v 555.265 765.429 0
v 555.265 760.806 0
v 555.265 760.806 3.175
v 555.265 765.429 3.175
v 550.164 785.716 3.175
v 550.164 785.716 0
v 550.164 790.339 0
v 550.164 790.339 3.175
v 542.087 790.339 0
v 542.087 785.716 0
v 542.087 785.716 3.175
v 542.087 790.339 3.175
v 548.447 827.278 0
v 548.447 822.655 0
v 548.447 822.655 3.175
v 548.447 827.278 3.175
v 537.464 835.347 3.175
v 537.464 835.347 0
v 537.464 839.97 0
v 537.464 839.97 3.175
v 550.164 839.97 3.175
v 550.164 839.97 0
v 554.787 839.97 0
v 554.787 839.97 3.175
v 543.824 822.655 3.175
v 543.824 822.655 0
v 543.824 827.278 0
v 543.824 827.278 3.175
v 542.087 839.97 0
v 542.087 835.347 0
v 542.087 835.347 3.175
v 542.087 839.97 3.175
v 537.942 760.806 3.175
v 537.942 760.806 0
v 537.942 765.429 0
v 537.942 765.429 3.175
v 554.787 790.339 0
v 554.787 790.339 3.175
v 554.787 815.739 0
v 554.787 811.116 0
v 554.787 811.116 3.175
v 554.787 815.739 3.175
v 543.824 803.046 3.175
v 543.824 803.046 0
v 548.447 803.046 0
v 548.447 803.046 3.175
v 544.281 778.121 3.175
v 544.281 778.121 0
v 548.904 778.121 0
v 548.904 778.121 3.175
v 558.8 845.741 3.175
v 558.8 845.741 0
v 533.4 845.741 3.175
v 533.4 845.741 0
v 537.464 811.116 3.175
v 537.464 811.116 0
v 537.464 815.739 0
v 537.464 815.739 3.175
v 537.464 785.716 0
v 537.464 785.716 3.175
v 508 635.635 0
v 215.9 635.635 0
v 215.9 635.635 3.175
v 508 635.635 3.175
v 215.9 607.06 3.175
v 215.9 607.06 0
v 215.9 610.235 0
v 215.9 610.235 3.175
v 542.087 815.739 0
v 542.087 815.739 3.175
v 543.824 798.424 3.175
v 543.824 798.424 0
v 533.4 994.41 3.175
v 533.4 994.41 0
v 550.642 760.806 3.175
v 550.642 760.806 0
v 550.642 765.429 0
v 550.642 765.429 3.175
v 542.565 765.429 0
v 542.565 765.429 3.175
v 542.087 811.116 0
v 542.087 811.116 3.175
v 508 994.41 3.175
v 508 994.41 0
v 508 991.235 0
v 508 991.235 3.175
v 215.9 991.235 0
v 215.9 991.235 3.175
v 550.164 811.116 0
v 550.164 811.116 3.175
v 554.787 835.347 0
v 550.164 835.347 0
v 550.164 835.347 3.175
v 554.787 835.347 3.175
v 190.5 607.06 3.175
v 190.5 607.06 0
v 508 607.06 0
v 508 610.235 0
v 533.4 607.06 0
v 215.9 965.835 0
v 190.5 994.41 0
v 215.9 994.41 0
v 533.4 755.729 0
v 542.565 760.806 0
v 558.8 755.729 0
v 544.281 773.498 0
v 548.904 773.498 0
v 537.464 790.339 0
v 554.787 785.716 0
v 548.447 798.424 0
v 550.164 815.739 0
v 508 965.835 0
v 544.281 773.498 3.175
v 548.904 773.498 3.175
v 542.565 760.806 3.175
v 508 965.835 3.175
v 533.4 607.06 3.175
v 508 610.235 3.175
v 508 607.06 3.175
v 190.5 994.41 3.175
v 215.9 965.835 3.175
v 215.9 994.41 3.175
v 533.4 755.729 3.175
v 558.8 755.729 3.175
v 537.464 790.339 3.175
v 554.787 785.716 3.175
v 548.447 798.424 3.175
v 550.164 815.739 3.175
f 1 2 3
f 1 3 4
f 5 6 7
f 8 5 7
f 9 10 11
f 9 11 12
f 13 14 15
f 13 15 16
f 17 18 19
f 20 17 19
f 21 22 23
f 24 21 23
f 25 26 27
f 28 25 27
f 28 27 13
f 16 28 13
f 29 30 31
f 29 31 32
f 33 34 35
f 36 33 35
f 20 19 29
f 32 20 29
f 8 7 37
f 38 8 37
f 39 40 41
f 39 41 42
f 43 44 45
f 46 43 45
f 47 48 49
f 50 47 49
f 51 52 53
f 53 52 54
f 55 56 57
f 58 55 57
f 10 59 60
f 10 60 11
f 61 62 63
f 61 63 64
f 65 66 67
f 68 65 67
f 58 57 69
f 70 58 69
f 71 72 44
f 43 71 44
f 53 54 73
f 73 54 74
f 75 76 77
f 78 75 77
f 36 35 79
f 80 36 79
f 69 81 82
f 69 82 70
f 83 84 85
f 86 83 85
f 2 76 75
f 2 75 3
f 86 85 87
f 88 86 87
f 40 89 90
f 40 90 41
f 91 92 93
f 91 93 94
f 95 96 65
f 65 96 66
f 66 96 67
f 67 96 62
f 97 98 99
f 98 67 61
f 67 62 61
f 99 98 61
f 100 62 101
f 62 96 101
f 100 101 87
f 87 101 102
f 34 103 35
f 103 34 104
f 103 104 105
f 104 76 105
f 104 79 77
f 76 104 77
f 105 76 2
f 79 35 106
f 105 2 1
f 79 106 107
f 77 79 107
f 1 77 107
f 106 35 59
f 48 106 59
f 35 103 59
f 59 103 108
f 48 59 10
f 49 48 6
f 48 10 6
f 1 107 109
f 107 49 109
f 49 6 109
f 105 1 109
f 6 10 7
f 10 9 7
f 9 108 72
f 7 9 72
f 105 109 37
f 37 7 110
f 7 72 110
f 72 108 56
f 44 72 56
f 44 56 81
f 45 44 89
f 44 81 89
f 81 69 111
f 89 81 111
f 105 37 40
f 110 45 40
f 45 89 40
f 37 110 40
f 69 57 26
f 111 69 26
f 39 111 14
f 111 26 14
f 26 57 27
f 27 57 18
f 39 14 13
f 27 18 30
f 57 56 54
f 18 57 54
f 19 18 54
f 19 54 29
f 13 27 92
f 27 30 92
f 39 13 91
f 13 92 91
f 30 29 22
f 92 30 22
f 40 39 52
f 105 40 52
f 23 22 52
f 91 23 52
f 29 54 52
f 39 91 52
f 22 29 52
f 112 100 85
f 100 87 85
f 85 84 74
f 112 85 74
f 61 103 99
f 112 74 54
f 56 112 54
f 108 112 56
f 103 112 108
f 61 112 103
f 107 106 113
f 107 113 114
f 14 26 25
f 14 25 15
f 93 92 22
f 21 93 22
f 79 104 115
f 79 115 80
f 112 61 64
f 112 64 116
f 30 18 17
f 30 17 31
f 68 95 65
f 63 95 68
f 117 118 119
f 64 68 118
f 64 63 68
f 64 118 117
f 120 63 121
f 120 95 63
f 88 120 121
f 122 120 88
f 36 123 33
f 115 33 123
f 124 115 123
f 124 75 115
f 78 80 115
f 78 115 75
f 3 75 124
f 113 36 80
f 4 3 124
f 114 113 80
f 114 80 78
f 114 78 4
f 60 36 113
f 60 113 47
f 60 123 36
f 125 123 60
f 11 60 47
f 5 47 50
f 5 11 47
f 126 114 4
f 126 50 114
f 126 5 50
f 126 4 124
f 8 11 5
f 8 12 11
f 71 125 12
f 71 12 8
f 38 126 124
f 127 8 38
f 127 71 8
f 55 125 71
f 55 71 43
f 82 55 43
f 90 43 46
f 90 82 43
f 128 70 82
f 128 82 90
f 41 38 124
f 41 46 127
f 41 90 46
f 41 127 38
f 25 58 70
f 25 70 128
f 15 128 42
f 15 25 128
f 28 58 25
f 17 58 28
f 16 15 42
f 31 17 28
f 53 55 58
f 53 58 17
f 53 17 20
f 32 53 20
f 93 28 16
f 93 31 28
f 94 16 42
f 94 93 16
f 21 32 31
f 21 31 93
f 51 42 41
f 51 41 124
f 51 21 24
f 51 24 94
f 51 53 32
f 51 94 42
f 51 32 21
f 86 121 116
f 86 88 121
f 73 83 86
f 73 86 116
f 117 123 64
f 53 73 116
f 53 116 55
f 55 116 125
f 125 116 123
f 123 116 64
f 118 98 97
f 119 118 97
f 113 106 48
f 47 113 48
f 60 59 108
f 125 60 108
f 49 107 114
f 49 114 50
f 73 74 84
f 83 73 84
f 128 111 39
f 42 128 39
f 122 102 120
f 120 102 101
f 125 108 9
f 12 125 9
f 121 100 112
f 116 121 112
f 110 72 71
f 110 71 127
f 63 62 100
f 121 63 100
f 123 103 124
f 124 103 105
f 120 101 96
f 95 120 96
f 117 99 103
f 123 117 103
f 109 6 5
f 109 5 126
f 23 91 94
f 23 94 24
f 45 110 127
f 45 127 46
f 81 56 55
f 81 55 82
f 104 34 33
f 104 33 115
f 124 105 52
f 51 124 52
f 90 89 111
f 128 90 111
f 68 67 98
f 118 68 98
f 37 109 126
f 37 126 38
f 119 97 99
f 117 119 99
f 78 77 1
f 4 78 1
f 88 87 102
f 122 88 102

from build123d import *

# Parameters (mm, degrees)
F0_W     = 4.6228
F0_H     = 4.6228
F0_W_2   = 292.1
F0_H_2   = 330.2
F1_DEPTH = 3.175


# Not quite as in the source:
# - a length typed as a fraction of an inch, garbled in the dataset ("3 / 203.2 mm" for 3/8 in), is restored


with BuildPart() as f1:
    # F0 (on Top) → F1 (new body)
    with BuildSketch(Plane.XY):
        Polygon((190.4998123646, 755.6496634722), (190.4998123646, 635.6350152016), (190.4998123646, 610.2350152016), (190.4998123646, 607.0600152016), (215.8998123646, 607.0600152016), (215.8998123646, 610.2350152016), (507.9998123646, 610.2350152016), (507.9998123646, 607.0600152016), (533.3998123646, 607.0600152016), (533.3998123646, 610.2350152016), (533.3998123646, 755.7291580558), (558.7998123646, 755.7291580558), (558.7998123646, 760.8061958763), (558.7998123646, 800.7350152016), (558.7998123646, 845.7408688016), (533.3998123646, 845.7408688016), (533.3998123646, 991.2350152016), (533.3998123646, 994.4100152016), (507.9998123646, 994.4100152016), (507.9998123646, 991.2350152016), (215.8998123646, 991.2350152016), (215.8998123646, 994.4100152016), (190.4998123646, 994.4100152016), (190.4998123646, 991.2350152016), (190.4998123646, 857.2496634722), align=None)
        with Locations((540.2533960062, 763.1175958763)):
            Rectangle(F0_W, F0_H, mode=Mode.SUBTRACT)
        with Locations((552.9533960062, 763.1175958763)):
            Rectangle(F0_W, F0_H, mode=Mode.SUBTRACT)
        with Locations((546.5928981277, 775.8096898529)):
            Rectangle(F0_W, F0_H, mode=Mode.SUBTRACT)
        with Locations((539.7752002493, 788.0271025263)):
            Rectangle(F0_W, F0_H, mode=Mode.SUBTRACT)
        with Locations((552.4752002493, 788.0271025263)):
            Rectangle(F0_W, F0_H, mode=Mode.SUBTRACT)
        with Locations((546.1356981277, 800.7350085497)):
            Rectangle(F0_W, F0_H, mode=Mode.SUBTRACT)
        with Locations((361.9498123646, 800.7350152016)):
            Rectangle(F0_W_2, F0_H_2, mode=Mode.SUBTRACT)
        with Locations((539.7752002493, 813.4271025263)):
            Rectangle(F0_W, F0_H, mode=Mode.SUBTRACT)
        with Locations((552.4752002493, 813.4271025263)):
            Rectangle(F0_W, F0_H, mode=Mode.SUBTRACT)
        with Locations((546.1356981277, 824.9666085497)):
            Rectangle(F0_W, F0_H, mode=Mode.SUBTRACT)
        with Locations((539.7752002493, 837.6587025263)):
            Rectangle(F0_W, F0_H, mode=Mode.SUBTRACT)
        with Locations((552.4752002493, 837.6587025263)):
            Rectangle(F0_W, F0_H, mode=Mode.SUBTRACT)
    extrude(amount=F1_DEPTH)


solid = f1.part
